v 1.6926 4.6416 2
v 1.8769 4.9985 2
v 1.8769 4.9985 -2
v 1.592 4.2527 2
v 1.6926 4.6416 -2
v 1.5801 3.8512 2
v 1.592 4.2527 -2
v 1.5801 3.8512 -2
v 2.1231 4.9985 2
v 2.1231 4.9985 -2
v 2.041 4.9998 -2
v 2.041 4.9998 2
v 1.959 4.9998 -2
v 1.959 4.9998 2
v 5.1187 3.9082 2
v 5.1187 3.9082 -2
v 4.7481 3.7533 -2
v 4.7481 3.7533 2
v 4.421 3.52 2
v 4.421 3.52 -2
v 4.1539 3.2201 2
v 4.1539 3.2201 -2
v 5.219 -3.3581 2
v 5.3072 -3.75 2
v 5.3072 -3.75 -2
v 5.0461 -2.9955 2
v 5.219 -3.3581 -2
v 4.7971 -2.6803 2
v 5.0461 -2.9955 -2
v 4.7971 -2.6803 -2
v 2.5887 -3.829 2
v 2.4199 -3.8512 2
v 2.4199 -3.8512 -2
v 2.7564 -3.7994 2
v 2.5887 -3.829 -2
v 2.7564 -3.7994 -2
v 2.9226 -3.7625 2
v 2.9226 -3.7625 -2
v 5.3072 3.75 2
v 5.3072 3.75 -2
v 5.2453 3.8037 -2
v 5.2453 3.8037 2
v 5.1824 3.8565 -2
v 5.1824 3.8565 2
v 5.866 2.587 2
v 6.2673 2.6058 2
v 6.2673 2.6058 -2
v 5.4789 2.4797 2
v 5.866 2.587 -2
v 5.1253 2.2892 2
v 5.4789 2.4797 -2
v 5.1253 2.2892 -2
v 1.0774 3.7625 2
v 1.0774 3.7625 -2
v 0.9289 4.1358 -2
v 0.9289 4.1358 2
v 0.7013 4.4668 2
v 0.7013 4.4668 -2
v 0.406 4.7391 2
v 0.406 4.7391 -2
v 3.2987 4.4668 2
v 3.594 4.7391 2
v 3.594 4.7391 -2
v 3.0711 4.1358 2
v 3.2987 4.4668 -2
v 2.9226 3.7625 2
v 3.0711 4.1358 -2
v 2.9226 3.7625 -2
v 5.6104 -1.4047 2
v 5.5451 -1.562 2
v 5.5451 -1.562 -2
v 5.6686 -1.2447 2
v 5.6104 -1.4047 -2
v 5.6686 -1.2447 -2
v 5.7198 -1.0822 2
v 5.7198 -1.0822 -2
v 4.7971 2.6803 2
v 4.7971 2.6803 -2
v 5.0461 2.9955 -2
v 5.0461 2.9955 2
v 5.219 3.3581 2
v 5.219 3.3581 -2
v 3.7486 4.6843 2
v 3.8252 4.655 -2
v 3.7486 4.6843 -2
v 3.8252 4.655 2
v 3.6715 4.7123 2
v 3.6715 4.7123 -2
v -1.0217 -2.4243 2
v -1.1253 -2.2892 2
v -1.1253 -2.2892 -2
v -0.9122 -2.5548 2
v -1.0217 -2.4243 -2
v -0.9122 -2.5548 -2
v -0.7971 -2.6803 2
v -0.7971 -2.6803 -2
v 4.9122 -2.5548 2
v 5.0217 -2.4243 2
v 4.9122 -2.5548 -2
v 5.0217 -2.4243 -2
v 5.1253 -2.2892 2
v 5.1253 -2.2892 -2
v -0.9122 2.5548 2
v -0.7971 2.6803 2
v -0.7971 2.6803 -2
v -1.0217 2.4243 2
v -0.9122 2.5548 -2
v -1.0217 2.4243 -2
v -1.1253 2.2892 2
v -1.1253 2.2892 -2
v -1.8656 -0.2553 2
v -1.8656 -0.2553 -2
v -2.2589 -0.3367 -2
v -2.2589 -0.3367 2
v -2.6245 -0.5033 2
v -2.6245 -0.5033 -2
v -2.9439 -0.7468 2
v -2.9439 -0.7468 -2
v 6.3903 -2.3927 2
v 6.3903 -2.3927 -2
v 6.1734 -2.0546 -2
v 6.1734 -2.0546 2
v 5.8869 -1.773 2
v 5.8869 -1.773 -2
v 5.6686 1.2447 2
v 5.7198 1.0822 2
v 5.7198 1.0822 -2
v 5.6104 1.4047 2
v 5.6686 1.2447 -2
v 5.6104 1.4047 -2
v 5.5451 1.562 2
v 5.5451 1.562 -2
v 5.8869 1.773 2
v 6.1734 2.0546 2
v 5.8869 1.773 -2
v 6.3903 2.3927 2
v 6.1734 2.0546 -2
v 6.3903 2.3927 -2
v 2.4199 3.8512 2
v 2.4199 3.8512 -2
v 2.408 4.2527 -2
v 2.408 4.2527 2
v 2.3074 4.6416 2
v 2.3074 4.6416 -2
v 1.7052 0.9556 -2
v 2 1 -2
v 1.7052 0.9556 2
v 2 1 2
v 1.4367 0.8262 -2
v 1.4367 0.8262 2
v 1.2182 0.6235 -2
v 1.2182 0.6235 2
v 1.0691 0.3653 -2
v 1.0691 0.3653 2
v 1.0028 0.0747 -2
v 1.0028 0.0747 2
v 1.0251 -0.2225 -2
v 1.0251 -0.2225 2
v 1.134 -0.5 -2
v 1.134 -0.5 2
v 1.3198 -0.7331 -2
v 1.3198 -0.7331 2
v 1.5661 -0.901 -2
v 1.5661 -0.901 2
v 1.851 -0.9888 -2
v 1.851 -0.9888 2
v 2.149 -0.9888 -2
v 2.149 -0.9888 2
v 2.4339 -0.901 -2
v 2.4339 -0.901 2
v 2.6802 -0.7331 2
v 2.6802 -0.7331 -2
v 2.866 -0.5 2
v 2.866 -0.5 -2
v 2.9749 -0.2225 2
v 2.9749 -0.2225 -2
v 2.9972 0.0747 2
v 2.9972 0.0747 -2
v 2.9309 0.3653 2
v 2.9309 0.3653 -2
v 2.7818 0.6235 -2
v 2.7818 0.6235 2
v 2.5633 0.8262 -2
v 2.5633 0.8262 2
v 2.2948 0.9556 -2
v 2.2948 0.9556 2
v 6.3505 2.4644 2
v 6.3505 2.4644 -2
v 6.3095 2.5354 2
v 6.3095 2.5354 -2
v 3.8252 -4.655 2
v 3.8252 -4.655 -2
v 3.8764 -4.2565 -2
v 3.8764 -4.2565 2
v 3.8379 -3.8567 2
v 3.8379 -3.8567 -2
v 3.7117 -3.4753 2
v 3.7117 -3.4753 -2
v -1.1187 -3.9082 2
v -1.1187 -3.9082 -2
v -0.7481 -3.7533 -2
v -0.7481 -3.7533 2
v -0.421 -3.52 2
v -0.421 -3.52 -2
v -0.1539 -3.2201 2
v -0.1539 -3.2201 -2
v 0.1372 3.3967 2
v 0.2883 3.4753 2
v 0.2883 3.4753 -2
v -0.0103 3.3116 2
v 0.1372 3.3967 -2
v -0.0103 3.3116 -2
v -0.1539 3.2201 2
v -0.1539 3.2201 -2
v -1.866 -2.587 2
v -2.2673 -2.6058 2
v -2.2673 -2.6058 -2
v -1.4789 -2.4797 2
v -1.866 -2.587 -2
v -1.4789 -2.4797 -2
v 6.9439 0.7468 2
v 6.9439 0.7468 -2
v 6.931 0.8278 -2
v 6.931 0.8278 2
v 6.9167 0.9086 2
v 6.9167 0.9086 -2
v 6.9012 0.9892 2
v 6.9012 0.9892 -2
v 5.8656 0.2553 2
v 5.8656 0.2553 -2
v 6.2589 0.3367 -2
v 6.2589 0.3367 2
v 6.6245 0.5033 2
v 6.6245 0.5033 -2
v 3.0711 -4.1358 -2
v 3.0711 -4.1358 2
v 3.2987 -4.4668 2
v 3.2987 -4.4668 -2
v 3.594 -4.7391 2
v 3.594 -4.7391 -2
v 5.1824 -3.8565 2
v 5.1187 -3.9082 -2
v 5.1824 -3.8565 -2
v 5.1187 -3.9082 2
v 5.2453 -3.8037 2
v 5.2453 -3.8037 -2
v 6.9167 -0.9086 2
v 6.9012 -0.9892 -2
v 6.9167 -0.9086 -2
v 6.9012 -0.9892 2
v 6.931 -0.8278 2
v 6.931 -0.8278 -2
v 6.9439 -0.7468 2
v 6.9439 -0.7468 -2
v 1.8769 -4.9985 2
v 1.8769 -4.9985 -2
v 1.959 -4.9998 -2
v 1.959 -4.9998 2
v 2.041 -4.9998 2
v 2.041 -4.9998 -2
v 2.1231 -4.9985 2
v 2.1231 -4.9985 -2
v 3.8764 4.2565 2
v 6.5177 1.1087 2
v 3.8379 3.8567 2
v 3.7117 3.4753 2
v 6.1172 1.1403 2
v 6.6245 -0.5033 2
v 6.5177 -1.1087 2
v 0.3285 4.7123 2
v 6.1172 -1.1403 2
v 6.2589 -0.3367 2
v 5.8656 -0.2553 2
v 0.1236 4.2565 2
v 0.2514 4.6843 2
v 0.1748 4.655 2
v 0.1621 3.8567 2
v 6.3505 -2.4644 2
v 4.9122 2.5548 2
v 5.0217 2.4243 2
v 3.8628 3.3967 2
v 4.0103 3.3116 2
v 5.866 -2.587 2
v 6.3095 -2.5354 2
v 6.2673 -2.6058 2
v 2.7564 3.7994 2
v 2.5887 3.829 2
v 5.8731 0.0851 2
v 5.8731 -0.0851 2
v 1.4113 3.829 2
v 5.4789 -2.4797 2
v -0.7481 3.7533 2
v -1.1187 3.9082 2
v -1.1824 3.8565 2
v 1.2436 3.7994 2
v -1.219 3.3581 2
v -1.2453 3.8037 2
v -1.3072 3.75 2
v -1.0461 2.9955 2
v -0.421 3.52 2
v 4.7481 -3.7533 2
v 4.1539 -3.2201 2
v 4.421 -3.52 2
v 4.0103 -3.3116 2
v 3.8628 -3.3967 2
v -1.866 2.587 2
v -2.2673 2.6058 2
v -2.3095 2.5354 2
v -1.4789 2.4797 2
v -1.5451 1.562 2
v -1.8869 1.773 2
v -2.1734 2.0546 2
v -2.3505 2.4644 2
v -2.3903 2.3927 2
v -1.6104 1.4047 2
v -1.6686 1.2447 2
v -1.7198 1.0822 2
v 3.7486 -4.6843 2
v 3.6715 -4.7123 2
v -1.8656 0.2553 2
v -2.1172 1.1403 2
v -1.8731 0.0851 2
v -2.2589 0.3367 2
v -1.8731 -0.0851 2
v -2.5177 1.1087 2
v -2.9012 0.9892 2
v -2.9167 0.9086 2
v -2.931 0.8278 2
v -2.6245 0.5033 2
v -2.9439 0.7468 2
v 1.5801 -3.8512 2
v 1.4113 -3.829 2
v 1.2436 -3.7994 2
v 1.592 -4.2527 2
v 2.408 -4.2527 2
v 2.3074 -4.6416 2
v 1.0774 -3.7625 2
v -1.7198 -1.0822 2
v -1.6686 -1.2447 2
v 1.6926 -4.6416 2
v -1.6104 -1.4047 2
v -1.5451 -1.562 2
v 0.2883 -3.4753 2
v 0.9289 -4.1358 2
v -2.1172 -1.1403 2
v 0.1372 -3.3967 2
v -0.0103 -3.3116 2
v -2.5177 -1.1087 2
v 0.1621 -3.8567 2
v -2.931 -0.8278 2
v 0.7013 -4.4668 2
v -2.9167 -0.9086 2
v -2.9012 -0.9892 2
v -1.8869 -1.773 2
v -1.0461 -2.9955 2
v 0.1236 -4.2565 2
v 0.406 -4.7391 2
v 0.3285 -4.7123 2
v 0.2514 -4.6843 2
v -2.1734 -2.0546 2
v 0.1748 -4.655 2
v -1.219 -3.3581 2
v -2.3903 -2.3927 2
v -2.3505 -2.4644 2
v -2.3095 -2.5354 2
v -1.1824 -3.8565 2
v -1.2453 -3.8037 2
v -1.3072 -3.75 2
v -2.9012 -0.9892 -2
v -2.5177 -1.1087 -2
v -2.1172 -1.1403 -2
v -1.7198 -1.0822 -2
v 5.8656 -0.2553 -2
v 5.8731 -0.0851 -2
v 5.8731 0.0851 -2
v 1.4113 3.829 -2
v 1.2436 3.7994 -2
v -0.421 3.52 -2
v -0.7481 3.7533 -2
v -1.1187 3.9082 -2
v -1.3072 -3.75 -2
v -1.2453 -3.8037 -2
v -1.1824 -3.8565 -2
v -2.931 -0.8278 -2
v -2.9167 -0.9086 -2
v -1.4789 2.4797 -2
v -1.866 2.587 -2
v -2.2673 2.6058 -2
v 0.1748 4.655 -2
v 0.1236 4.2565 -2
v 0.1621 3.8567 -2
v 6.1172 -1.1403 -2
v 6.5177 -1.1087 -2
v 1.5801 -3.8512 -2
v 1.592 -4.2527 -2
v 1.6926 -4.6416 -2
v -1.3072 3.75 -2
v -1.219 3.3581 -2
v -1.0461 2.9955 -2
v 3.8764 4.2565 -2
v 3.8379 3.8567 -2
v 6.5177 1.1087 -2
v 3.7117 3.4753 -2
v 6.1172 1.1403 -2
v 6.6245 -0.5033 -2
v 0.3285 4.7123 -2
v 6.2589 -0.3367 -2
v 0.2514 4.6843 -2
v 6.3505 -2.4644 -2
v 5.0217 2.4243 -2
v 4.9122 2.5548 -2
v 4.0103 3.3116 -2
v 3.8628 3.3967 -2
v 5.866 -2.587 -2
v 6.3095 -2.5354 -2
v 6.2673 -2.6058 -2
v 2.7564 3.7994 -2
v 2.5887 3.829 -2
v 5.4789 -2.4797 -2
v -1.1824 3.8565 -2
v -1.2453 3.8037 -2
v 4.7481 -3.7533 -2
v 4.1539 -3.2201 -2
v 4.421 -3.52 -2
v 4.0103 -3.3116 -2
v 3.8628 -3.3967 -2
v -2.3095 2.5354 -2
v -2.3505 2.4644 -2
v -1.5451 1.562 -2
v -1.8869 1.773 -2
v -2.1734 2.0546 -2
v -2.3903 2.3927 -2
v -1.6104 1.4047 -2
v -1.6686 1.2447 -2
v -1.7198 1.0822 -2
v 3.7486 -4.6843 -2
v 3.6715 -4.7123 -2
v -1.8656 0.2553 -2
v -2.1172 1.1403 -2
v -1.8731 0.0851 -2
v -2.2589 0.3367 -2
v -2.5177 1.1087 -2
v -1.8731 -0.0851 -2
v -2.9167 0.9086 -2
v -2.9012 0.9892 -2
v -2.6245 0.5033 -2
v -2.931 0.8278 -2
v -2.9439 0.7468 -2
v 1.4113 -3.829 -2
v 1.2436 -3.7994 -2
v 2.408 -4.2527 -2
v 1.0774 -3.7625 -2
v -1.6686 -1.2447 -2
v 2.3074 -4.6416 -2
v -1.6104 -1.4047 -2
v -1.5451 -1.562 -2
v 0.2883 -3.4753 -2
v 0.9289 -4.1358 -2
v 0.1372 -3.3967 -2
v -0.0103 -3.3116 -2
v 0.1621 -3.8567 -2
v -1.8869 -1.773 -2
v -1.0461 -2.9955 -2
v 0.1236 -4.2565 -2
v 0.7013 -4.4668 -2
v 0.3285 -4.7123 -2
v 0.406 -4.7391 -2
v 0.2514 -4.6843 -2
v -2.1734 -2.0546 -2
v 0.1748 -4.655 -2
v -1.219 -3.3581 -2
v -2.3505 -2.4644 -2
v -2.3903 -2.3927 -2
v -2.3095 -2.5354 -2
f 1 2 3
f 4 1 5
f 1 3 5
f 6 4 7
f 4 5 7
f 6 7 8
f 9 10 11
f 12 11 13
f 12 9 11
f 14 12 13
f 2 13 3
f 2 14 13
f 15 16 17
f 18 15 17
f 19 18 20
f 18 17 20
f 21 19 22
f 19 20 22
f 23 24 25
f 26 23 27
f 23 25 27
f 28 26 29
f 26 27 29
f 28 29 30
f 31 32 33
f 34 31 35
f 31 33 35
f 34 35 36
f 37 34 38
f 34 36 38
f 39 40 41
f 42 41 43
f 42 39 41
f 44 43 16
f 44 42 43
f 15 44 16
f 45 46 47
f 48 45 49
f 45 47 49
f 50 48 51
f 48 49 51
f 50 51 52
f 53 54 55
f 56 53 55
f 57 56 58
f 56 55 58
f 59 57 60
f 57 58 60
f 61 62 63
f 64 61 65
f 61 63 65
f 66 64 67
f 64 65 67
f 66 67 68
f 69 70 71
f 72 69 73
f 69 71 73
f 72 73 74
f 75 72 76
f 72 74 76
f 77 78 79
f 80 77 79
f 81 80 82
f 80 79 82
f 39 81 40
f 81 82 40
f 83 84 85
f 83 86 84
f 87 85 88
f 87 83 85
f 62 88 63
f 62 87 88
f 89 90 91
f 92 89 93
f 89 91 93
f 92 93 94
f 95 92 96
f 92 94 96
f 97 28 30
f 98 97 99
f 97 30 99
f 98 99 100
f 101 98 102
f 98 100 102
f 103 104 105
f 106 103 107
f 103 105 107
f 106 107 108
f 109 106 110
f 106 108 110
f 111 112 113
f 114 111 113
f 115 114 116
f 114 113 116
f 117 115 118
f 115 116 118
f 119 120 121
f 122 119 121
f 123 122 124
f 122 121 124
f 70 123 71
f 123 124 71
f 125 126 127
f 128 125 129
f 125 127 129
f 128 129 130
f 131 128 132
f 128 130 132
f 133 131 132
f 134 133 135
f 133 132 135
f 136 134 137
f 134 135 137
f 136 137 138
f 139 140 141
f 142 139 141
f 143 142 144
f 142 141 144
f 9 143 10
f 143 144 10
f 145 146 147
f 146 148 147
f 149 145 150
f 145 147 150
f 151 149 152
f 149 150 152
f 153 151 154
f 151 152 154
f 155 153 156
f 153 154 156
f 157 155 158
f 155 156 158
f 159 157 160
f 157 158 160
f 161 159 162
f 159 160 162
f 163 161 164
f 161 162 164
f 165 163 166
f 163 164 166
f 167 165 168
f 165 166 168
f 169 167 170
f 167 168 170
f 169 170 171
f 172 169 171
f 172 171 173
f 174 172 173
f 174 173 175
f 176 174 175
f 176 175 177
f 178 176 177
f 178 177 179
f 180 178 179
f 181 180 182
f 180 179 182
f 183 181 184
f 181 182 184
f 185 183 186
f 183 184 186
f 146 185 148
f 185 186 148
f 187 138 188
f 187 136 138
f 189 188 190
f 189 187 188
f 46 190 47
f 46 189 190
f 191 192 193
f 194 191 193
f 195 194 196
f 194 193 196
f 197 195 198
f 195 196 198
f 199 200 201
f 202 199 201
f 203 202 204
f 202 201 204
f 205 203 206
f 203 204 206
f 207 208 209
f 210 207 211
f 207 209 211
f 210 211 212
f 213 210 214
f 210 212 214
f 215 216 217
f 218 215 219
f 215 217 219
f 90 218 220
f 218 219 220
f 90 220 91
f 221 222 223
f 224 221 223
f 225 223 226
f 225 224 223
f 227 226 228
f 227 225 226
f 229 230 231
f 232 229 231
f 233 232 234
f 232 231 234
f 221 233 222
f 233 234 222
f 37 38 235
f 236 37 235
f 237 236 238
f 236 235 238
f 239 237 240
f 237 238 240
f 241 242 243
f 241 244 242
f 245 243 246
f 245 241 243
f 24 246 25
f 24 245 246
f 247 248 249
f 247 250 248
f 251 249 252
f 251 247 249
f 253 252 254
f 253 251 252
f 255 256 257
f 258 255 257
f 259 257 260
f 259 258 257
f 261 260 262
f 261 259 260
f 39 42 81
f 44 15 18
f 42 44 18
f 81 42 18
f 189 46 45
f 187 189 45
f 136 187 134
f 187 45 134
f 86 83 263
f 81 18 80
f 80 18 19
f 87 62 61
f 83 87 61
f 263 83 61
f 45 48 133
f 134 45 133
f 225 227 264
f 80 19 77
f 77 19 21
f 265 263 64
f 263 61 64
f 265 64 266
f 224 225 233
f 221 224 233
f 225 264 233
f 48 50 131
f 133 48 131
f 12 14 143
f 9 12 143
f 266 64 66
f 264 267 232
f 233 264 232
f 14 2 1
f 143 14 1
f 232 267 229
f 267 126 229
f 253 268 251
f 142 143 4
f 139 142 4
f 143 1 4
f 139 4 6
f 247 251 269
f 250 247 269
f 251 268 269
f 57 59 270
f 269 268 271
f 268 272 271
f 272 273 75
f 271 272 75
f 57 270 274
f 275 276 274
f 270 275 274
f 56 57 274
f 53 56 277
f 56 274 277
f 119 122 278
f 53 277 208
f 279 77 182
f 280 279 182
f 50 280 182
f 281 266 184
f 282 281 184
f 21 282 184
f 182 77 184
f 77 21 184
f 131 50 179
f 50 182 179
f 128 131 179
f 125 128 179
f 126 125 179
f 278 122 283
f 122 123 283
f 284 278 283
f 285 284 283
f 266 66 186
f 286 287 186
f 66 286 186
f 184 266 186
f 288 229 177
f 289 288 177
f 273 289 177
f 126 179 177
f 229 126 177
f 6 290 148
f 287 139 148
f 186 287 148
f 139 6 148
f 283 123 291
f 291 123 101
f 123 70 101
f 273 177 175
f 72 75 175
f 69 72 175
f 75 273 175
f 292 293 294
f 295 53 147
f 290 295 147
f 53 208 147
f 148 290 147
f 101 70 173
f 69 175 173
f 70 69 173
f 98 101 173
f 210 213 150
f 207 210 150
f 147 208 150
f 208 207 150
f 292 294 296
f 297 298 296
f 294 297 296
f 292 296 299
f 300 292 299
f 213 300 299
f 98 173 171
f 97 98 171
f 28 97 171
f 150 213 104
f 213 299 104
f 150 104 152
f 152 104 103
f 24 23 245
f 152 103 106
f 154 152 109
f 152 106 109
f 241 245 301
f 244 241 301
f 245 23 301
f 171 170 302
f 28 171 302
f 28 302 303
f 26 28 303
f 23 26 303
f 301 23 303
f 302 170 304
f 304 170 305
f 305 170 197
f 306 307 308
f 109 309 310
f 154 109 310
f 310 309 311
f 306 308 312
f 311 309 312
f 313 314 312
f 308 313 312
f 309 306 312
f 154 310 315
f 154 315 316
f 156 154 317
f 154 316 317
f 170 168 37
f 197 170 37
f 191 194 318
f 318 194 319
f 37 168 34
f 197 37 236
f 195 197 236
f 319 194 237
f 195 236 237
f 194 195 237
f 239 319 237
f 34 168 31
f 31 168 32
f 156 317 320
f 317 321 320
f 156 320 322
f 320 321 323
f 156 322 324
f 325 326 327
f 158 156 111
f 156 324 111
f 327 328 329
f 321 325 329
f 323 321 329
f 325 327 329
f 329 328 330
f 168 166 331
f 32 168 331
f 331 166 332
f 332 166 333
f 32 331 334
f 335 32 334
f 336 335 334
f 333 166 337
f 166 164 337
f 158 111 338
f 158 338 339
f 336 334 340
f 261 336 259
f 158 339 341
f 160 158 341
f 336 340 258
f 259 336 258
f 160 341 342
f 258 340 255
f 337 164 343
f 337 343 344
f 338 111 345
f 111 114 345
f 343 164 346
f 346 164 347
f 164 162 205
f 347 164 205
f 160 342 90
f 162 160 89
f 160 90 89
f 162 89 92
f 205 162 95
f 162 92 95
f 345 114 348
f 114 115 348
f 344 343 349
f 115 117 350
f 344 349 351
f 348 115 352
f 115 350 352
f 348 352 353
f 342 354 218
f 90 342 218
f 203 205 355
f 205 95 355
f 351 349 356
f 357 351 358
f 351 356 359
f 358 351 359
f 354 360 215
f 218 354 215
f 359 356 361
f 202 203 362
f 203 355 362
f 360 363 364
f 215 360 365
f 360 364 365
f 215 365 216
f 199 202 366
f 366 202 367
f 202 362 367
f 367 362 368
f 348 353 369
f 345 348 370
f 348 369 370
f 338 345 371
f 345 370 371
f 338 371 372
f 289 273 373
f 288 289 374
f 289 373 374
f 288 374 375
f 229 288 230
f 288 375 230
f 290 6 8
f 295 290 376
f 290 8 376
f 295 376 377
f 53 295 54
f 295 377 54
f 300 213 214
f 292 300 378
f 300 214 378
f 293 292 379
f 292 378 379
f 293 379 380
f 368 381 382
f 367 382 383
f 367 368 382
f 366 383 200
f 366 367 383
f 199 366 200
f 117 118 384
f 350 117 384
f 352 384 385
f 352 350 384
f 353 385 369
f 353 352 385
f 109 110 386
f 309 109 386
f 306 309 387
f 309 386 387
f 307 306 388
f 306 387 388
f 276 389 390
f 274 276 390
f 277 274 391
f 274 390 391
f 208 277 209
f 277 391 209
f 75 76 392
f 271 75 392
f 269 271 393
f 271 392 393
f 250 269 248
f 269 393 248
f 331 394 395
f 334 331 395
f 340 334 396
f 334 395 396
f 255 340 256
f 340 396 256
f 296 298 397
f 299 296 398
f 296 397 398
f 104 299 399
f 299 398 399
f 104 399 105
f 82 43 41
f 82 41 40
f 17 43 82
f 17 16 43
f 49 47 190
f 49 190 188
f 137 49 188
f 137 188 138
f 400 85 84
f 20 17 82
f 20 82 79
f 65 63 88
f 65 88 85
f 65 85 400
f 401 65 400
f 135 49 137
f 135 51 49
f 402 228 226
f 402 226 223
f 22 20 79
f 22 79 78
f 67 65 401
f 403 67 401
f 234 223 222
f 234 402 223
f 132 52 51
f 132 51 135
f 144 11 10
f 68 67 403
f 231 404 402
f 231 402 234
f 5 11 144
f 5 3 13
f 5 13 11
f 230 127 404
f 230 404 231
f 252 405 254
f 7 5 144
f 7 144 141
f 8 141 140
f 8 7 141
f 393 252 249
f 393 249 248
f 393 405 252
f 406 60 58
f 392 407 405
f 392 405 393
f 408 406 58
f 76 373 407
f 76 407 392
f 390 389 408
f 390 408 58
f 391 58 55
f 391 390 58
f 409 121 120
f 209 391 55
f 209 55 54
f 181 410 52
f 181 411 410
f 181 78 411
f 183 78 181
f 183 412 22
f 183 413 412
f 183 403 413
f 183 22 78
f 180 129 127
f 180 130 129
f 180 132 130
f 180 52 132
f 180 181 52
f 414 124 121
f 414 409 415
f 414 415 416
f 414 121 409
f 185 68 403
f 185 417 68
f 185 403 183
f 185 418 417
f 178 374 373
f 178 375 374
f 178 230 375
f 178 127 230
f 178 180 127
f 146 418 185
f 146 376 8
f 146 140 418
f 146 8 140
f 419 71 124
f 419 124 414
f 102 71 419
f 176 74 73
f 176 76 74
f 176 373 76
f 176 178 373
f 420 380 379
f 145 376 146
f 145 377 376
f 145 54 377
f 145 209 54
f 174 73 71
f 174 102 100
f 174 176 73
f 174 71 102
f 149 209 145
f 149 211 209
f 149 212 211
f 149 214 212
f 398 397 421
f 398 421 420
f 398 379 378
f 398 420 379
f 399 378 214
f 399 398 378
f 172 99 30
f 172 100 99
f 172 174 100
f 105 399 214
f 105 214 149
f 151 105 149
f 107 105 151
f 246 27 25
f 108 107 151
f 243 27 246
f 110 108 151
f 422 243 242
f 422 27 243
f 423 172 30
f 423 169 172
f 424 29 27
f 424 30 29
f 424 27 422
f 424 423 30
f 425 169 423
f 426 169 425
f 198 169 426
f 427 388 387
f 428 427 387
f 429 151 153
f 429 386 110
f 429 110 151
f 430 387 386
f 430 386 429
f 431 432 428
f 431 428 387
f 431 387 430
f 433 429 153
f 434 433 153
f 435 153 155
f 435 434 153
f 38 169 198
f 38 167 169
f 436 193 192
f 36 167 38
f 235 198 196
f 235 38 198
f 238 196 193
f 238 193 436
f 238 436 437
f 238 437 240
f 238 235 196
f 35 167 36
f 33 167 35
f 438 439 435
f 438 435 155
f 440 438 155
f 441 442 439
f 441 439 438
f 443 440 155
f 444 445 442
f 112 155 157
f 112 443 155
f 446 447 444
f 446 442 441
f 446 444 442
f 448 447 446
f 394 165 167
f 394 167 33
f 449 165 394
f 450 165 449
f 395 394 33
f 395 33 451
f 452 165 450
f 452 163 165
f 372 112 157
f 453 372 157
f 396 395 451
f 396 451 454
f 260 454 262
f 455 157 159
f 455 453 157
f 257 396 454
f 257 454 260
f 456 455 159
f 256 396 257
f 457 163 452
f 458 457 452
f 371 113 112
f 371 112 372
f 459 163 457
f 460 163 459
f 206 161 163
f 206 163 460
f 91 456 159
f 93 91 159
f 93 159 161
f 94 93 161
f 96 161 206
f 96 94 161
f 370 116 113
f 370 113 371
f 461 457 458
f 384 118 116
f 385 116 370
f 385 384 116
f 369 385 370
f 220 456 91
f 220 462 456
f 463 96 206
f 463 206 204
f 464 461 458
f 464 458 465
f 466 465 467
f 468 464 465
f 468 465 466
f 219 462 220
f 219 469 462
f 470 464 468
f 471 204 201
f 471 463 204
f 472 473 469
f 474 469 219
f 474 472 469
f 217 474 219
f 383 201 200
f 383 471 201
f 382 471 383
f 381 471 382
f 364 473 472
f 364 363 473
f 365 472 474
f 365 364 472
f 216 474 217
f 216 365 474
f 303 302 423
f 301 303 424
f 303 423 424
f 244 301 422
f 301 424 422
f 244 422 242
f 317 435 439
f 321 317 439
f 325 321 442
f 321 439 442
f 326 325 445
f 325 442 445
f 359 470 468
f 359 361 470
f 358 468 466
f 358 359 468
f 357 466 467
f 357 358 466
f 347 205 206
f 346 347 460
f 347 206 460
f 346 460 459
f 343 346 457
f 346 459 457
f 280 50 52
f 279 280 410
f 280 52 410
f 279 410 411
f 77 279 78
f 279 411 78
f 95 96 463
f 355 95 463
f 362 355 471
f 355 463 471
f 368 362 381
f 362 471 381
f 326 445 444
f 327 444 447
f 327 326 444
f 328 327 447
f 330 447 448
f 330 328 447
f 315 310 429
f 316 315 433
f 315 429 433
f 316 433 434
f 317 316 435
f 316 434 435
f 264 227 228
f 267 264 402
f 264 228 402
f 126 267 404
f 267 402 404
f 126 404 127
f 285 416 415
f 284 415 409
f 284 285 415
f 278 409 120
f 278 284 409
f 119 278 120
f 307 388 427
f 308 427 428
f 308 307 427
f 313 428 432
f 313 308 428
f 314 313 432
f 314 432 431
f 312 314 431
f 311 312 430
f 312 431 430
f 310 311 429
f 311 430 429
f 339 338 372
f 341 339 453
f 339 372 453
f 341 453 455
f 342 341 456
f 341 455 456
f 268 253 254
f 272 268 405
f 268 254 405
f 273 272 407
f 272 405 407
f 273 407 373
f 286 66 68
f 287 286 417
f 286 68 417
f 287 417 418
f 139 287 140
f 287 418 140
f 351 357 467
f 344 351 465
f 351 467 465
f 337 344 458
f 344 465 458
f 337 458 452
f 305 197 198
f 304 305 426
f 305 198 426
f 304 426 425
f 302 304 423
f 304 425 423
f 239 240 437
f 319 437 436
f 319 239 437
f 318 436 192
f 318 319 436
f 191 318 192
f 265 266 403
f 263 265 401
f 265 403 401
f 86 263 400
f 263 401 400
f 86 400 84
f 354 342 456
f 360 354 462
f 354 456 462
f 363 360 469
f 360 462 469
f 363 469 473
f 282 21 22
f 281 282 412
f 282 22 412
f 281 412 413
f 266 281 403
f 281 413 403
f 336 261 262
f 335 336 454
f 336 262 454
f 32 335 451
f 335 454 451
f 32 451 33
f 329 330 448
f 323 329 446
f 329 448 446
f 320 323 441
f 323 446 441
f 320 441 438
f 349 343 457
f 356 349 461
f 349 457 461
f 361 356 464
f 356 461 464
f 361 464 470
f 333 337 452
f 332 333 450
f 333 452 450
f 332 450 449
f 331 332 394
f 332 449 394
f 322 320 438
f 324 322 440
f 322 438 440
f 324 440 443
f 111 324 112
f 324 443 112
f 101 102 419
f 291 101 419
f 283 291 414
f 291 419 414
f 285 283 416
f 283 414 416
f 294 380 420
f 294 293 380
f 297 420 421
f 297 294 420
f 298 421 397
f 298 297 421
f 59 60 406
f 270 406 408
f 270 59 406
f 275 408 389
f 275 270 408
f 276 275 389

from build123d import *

# Parameters (mm, degrees)
BASPROSKE_W           = 4
BASPROSKE_H           = 5
TOOTHCUT_DEPTH        = 9.124038405
TEETHCUTS_COUNT       = 18
TEETHCUTS_ANGLE       = 340
BORSKE_R              = 1
BORE_DEPTH            = 50.0000508
BODY_MOVE_COPY1_ANGLE = 90
BODY_MOVE_COPY2_ANGLE = 90


with BuildPart() as part:
    # BasProSke → Base-Revolve (revolve)
    with BuildSketch(Plane(origin=(0, 0, 0), x_dir=(1, 0, 0), z_dir=(0, 1, 0)), mode=Mode.PRIVATE) as base_revolve_sk:
        with Locations((2, 2.5)):
            Rectangle(BASPROSKE_W, BASPROSKE_H)
    revolve(base_revolve_sk.sketch.rotate(Axis((-10, 0, 0), (1, 0, 0)), 180), axis=Axis((-10, 0, 0), (1, 0, 0)))

    # TooCutSke → ToothCut (cut, through all)
    with BuildSketch(Plane(origin=(0, 0, 0), x_dir=(0, 0, -1), z_dir=(1, 0, 0))):
        with BuildLine():
            ThreePointArc((0.25527463, 3.865580275), (0, 3.874), (-0.25527463, 3.865580275))
            ThreePointArc((-0.25527463, 3.865580275), (-0.416281865, 4.46052923), (-0.768562654, 4.96628197))
            ThreePointArc((-0.768562654, 4.96628197), (0, 5.0254), (0.768562654, 4.96628197))
            ThreePointArc((0.768562654, 4.96628197), (0.416281865, 4.46052923), (0.25527463, 3.865580275))
        make_face()
    toothcut = extrude(amount=TOOTHCUT_DEPTH, mode=Mode.SUBTRACT)

    # TeethCuts: ToothCut ×18 about axis
    teethcuts_axis = Axis((-10, 0, 0), (1, 0, 0))
    for i in range(1, TEETHCUTS_COUNT):
        add(toothcut.rotate(teethcuts_axis, i * TEETHCUTS_ANGLE / (TEETHCUTS_COUNT - 1)), mode=Mode.SUBTRACT)

    # BorSke → Bore (cut, symmetric)
    with BuildSketch(Plane(origin=(0, 0, 0), x_dir=(0, 0, -1), z_dir=(1, 0, 0))):
        with Locations(Location((0, 0, 0), (0, 0, 180))):
            Circle(BORSKE_R)
    extrude(amount=BORE_DEPTH, both=True, mode=Mode.SUBTRACT)


with BuildPart() as part_1:
    # Body-Move/Copy1: moved
    add(part.part.rotate(Axis((2, 0, 0), (0, 0, -1)), BODY_MOVE_COPY1_ANGLE))


with BuildPart() as part_2:
    # Body-Move/Copy2: moved
    add(part_1.part.rotate(Axis((0, 0, 0), (-1, 0, 0)), BODY_MOVE_COPY2_ANGLE))


solid = part_2.part
